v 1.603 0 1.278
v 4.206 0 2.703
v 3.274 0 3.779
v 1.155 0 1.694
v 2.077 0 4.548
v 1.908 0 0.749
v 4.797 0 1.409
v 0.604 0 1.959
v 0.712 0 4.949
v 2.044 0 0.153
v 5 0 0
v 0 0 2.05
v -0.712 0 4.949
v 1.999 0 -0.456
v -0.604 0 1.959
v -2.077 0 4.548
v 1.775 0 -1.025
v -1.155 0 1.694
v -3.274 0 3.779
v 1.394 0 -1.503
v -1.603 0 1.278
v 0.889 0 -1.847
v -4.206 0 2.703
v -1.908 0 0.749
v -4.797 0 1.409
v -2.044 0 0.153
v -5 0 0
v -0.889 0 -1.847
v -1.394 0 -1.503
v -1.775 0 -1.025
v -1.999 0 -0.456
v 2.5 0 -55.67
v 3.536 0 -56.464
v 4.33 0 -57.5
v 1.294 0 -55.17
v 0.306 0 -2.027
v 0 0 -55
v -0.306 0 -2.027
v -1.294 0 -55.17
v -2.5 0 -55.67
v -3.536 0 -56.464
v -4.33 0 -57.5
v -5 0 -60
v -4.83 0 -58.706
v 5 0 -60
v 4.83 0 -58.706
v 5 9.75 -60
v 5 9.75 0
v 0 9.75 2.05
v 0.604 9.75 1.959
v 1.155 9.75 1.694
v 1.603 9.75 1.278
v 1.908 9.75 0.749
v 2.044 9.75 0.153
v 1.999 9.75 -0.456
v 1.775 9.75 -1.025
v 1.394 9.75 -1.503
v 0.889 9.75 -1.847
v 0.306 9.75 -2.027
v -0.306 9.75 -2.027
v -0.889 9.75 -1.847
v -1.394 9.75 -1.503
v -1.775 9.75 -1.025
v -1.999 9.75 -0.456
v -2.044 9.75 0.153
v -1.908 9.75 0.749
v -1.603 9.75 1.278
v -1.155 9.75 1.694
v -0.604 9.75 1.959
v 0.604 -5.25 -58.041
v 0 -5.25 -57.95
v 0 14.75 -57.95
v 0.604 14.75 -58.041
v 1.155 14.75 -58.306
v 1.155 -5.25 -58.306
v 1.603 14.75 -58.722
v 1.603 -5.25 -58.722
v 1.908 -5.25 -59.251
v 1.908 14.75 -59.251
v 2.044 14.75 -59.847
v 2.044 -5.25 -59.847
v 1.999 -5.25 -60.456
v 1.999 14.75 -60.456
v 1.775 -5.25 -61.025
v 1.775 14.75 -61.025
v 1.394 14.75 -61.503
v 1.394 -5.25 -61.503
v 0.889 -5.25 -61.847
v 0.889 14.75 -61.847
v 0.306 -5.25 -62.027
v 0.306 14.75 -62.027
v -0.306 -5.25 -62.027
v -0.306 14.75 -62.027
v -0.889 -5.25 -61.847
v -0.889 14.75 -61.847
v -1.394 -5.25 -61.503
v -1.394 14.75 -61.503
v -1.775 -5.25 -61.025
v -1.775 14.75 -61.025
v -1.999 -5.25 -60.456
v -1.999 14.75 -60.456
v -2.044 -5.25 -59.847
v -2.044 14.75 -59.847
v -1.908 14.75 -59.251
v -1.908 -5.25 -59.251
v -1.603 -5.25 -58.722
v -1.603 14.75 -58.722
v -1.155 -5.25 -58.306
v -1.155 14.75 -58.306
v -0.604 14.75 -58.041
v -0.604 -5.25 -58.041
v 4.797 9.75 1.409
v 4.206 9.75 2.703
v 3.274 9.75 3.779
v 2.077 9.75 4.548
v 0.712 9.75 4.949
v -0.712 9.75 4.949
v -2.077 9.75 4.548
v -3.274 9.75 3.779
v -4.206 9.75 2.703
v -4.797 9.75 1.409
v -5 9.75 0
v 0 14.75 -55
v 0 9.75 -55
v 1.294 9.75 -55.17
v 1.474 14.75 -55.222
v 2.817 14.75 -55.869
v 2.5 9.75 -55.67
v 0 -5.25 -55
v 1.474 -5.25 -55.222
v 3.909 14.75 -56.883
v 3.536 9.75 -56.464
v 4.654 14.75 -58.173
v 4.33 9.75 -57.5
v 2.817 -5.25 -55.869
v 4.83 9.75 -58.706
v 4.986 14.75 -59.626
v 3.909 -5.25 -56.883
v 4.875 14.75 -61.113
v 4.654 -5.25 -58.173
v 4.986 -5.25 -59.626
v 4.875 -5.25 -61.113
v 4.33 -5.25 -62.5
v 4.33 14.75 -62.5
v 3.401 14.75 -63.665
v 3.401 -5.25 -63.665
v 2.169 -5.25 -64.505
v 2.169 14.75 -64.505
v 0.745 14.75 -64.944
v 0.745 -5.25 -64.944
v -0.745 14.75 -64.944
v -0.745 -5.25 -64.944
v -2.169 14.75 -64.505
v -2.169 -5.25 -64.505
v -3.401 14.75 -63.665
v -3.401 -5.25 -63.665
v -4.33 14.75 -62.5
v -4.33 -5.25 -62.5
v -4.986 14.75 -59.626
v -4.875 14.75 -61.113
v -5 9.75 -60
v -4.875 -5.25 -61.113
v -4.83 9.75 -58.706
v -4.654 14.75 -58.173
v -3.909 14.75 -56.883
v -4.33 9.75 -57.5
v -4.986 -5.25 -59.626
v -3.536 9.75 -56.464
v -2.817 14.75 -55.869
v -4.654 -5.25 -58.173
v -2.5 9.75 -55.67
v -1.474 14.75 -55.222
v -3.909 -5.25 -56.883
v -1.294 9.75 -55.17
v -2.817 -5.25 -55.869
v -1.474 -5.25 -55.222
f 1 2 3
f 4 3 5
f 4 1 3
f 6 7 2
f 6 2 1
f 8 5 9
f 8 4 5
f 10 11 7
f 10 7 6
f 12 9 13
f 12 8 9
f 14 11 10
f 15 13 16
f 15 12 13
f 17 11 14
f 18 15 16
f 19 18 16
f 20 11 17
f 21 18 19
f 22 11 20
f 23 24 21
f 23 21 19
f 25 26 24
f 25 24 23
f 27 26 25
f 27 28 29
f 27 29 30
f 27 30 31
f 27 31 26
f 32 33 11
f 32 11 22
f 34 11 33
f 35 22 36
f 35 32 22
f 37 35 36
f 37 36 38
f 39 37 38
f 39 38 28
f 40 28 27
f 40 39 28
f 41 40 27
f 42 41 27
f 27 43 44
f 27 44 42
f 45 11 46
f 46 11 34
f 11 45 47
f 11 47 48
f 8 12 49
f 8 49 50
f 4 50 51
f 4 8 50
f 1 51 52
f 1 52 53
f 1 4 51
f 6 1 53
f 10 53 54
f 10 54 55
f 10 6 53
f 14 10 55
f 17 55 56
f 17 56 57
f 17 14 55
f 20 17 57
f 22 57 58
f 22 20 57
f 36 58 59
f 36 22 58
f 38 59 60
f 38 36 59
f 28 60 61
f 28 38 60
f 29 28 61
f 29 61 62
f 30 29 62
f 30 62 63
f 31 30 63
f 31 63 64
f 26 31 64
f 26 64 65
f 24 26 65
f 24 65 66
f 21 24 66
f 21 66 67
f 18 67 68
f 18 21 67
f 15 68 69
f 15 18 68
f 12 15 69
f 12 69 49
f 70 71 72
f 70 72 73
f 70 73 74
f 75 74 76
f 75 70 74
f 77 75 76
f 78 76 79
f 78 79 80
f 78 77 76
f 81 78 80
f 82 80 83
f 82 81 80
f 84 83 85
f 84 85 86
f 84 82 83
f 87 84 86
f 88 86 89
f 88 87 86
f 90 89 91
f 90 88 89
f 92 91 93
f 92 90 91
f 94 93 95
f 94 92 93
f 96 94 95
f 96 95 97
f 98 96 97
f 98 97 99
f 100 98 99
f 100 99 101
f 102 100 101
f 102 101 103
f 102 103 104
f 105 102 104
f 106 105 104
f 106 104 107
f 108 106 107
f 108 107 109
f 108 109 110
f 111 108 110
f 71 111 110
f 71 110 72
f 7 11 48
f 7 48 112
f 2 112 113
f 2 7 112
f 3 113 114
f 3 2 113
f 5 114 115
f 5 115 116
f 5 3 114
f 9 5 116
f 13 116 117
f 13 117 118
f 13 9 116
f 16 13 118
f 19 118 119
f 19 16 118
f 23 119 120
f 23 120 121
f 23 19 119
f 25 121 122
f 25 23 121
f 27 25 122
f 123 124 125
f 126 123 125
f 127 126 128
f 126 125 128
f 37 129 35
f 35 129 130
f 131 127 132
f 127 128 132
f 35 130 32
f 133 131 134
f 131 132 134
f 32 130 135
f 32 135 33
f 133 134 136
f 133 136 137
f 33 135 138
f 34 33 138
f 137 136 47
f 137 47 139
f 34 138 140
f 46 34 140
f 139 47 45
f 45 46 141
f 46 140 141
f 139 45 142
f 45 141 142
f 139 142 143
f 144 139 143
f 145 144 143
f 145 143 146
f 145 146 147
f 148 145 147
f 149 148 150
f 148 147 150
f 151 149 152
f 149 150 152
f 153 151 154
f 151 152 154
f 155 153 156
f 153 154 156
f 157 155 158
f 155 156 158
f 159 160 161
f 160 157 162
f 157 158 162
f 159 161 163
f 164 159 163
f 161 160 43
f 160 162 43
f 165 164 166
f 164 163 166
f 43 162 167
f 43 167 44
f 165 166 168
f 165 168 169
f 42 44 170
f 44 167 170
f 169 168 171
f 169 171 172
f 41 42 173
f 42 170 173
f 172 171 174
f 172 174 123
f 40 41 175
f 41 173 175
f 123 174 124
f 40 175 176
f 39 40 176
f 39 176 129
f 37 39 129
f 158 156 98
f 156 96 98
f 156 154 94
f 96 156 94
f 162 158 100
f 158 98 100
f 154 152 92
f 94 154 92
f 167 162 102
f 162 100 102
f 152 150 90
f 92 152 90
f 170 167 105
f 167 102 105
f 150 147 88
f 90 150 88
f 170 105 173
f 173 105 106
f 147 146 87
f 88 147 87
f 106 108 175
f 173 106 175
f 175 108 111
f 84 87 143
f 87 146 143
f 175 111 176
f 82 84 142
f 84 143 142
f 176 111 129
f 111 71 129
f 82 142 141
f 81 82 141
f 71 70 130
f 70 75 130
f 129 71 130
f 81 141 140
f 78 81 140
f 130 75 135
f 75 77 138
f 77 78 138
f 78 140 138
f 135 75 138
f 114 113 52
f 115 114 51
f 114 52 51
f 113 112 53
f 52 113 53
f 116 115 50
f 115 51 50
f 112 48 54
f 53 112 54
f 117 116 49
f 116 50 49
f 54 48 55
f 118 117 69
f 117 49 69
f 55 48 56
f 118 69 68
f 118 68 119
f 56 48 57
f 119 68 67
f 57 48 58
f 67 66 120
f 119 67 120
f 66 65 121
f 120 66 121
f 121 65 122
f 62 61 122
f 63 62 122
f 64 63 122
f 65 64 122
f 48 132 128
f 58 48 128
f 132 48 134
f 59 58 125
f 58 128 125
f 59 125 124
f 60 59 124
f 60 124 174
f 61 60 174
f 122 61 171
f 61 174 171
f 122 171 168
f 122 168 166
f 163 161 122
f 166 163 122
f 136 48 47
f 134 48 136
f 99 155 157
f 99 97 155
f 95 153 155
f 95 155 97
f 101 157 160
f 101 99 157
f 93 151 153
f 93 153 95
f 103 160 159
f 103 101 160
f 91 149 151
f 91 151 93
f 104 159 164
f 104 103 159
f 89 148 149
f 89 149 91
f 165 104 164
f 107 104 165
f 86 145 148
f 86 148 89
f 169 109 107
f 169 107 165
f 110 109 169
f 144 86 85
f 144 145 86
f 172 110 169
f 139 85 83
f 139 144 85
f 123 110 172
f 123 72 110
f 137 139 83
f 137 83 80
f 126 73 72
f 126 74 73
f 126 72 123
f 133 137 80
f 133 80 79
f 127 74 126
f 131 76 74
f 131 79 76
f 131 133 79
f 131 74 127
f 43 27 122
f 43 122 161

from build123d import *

# Parameters (mm, degrees)
ESQUISSE1_R             = 2.05
BOSS_EXTRU_1_DEPTH      = 9.75
BOSS_EXTRU_2_DEPTH      = 5
BOSS_EXTRU_2_DEPTH_BACK = 15
ESQUISSE2_R             = 5
ESQUISSE2_R_2           = 2.05


with BuildPart() as part:
    # Esquisse1 → Boss.-Extru.1 (new body)
    with BuildSketch(Plane(origin=(0, 0, 0), x_dir=(1, 0, 0), z_dir=(0, 1, 0))):
        with BuildLine():
            Line((-5, 0), (-5, 60))
            ThreePointArc((-5, 60), (0, 65), (5, 60))
            Line((5, 60), (5, 0))
            ThreePointArc((5, 0), (0, -5), (-5, 0))
        make_face()
        with Locations(Location((0, 60, 0), (0, 0, 270))):
            Circle(ESQUISSE1_R, mode=Mode.SUBTRACT)
        with Locations(Location((0, 0, 0), (0, 0, 270))):
            Circle(ESQUISSE1_R, mode=Mode.SUBTRACT)
    extrude(amount=BOSS_EXTRU_1_DEPTH)

    # Esquisse2 → Boss.-Extru.2 (add, two sides: drawn at the far end of the back side and taken through both)
    with BuildSketch(Plane(origin=(0, 9.75, 0), x_dir=(1, 0, 0), z_dir=(0, 1, 0)).offset(-BOSS_EXTRU_2_DEPTH_BACK)):
        with Locations(Location((0, 60, 0), (0, 0, 270))):
            Circle(ESQUISSE2_R)
        with Locations(Location((0, 60, 0), (0, 0, 270))):
            Circle(ESQUISSE2_R_2, mode=Mode.SUBTRACT)
    extrude(amount=BOSS_EXTRU_2_DEPTH + BOSS_EXTRU_2_DEPTH_BACK)


solid = part.part
